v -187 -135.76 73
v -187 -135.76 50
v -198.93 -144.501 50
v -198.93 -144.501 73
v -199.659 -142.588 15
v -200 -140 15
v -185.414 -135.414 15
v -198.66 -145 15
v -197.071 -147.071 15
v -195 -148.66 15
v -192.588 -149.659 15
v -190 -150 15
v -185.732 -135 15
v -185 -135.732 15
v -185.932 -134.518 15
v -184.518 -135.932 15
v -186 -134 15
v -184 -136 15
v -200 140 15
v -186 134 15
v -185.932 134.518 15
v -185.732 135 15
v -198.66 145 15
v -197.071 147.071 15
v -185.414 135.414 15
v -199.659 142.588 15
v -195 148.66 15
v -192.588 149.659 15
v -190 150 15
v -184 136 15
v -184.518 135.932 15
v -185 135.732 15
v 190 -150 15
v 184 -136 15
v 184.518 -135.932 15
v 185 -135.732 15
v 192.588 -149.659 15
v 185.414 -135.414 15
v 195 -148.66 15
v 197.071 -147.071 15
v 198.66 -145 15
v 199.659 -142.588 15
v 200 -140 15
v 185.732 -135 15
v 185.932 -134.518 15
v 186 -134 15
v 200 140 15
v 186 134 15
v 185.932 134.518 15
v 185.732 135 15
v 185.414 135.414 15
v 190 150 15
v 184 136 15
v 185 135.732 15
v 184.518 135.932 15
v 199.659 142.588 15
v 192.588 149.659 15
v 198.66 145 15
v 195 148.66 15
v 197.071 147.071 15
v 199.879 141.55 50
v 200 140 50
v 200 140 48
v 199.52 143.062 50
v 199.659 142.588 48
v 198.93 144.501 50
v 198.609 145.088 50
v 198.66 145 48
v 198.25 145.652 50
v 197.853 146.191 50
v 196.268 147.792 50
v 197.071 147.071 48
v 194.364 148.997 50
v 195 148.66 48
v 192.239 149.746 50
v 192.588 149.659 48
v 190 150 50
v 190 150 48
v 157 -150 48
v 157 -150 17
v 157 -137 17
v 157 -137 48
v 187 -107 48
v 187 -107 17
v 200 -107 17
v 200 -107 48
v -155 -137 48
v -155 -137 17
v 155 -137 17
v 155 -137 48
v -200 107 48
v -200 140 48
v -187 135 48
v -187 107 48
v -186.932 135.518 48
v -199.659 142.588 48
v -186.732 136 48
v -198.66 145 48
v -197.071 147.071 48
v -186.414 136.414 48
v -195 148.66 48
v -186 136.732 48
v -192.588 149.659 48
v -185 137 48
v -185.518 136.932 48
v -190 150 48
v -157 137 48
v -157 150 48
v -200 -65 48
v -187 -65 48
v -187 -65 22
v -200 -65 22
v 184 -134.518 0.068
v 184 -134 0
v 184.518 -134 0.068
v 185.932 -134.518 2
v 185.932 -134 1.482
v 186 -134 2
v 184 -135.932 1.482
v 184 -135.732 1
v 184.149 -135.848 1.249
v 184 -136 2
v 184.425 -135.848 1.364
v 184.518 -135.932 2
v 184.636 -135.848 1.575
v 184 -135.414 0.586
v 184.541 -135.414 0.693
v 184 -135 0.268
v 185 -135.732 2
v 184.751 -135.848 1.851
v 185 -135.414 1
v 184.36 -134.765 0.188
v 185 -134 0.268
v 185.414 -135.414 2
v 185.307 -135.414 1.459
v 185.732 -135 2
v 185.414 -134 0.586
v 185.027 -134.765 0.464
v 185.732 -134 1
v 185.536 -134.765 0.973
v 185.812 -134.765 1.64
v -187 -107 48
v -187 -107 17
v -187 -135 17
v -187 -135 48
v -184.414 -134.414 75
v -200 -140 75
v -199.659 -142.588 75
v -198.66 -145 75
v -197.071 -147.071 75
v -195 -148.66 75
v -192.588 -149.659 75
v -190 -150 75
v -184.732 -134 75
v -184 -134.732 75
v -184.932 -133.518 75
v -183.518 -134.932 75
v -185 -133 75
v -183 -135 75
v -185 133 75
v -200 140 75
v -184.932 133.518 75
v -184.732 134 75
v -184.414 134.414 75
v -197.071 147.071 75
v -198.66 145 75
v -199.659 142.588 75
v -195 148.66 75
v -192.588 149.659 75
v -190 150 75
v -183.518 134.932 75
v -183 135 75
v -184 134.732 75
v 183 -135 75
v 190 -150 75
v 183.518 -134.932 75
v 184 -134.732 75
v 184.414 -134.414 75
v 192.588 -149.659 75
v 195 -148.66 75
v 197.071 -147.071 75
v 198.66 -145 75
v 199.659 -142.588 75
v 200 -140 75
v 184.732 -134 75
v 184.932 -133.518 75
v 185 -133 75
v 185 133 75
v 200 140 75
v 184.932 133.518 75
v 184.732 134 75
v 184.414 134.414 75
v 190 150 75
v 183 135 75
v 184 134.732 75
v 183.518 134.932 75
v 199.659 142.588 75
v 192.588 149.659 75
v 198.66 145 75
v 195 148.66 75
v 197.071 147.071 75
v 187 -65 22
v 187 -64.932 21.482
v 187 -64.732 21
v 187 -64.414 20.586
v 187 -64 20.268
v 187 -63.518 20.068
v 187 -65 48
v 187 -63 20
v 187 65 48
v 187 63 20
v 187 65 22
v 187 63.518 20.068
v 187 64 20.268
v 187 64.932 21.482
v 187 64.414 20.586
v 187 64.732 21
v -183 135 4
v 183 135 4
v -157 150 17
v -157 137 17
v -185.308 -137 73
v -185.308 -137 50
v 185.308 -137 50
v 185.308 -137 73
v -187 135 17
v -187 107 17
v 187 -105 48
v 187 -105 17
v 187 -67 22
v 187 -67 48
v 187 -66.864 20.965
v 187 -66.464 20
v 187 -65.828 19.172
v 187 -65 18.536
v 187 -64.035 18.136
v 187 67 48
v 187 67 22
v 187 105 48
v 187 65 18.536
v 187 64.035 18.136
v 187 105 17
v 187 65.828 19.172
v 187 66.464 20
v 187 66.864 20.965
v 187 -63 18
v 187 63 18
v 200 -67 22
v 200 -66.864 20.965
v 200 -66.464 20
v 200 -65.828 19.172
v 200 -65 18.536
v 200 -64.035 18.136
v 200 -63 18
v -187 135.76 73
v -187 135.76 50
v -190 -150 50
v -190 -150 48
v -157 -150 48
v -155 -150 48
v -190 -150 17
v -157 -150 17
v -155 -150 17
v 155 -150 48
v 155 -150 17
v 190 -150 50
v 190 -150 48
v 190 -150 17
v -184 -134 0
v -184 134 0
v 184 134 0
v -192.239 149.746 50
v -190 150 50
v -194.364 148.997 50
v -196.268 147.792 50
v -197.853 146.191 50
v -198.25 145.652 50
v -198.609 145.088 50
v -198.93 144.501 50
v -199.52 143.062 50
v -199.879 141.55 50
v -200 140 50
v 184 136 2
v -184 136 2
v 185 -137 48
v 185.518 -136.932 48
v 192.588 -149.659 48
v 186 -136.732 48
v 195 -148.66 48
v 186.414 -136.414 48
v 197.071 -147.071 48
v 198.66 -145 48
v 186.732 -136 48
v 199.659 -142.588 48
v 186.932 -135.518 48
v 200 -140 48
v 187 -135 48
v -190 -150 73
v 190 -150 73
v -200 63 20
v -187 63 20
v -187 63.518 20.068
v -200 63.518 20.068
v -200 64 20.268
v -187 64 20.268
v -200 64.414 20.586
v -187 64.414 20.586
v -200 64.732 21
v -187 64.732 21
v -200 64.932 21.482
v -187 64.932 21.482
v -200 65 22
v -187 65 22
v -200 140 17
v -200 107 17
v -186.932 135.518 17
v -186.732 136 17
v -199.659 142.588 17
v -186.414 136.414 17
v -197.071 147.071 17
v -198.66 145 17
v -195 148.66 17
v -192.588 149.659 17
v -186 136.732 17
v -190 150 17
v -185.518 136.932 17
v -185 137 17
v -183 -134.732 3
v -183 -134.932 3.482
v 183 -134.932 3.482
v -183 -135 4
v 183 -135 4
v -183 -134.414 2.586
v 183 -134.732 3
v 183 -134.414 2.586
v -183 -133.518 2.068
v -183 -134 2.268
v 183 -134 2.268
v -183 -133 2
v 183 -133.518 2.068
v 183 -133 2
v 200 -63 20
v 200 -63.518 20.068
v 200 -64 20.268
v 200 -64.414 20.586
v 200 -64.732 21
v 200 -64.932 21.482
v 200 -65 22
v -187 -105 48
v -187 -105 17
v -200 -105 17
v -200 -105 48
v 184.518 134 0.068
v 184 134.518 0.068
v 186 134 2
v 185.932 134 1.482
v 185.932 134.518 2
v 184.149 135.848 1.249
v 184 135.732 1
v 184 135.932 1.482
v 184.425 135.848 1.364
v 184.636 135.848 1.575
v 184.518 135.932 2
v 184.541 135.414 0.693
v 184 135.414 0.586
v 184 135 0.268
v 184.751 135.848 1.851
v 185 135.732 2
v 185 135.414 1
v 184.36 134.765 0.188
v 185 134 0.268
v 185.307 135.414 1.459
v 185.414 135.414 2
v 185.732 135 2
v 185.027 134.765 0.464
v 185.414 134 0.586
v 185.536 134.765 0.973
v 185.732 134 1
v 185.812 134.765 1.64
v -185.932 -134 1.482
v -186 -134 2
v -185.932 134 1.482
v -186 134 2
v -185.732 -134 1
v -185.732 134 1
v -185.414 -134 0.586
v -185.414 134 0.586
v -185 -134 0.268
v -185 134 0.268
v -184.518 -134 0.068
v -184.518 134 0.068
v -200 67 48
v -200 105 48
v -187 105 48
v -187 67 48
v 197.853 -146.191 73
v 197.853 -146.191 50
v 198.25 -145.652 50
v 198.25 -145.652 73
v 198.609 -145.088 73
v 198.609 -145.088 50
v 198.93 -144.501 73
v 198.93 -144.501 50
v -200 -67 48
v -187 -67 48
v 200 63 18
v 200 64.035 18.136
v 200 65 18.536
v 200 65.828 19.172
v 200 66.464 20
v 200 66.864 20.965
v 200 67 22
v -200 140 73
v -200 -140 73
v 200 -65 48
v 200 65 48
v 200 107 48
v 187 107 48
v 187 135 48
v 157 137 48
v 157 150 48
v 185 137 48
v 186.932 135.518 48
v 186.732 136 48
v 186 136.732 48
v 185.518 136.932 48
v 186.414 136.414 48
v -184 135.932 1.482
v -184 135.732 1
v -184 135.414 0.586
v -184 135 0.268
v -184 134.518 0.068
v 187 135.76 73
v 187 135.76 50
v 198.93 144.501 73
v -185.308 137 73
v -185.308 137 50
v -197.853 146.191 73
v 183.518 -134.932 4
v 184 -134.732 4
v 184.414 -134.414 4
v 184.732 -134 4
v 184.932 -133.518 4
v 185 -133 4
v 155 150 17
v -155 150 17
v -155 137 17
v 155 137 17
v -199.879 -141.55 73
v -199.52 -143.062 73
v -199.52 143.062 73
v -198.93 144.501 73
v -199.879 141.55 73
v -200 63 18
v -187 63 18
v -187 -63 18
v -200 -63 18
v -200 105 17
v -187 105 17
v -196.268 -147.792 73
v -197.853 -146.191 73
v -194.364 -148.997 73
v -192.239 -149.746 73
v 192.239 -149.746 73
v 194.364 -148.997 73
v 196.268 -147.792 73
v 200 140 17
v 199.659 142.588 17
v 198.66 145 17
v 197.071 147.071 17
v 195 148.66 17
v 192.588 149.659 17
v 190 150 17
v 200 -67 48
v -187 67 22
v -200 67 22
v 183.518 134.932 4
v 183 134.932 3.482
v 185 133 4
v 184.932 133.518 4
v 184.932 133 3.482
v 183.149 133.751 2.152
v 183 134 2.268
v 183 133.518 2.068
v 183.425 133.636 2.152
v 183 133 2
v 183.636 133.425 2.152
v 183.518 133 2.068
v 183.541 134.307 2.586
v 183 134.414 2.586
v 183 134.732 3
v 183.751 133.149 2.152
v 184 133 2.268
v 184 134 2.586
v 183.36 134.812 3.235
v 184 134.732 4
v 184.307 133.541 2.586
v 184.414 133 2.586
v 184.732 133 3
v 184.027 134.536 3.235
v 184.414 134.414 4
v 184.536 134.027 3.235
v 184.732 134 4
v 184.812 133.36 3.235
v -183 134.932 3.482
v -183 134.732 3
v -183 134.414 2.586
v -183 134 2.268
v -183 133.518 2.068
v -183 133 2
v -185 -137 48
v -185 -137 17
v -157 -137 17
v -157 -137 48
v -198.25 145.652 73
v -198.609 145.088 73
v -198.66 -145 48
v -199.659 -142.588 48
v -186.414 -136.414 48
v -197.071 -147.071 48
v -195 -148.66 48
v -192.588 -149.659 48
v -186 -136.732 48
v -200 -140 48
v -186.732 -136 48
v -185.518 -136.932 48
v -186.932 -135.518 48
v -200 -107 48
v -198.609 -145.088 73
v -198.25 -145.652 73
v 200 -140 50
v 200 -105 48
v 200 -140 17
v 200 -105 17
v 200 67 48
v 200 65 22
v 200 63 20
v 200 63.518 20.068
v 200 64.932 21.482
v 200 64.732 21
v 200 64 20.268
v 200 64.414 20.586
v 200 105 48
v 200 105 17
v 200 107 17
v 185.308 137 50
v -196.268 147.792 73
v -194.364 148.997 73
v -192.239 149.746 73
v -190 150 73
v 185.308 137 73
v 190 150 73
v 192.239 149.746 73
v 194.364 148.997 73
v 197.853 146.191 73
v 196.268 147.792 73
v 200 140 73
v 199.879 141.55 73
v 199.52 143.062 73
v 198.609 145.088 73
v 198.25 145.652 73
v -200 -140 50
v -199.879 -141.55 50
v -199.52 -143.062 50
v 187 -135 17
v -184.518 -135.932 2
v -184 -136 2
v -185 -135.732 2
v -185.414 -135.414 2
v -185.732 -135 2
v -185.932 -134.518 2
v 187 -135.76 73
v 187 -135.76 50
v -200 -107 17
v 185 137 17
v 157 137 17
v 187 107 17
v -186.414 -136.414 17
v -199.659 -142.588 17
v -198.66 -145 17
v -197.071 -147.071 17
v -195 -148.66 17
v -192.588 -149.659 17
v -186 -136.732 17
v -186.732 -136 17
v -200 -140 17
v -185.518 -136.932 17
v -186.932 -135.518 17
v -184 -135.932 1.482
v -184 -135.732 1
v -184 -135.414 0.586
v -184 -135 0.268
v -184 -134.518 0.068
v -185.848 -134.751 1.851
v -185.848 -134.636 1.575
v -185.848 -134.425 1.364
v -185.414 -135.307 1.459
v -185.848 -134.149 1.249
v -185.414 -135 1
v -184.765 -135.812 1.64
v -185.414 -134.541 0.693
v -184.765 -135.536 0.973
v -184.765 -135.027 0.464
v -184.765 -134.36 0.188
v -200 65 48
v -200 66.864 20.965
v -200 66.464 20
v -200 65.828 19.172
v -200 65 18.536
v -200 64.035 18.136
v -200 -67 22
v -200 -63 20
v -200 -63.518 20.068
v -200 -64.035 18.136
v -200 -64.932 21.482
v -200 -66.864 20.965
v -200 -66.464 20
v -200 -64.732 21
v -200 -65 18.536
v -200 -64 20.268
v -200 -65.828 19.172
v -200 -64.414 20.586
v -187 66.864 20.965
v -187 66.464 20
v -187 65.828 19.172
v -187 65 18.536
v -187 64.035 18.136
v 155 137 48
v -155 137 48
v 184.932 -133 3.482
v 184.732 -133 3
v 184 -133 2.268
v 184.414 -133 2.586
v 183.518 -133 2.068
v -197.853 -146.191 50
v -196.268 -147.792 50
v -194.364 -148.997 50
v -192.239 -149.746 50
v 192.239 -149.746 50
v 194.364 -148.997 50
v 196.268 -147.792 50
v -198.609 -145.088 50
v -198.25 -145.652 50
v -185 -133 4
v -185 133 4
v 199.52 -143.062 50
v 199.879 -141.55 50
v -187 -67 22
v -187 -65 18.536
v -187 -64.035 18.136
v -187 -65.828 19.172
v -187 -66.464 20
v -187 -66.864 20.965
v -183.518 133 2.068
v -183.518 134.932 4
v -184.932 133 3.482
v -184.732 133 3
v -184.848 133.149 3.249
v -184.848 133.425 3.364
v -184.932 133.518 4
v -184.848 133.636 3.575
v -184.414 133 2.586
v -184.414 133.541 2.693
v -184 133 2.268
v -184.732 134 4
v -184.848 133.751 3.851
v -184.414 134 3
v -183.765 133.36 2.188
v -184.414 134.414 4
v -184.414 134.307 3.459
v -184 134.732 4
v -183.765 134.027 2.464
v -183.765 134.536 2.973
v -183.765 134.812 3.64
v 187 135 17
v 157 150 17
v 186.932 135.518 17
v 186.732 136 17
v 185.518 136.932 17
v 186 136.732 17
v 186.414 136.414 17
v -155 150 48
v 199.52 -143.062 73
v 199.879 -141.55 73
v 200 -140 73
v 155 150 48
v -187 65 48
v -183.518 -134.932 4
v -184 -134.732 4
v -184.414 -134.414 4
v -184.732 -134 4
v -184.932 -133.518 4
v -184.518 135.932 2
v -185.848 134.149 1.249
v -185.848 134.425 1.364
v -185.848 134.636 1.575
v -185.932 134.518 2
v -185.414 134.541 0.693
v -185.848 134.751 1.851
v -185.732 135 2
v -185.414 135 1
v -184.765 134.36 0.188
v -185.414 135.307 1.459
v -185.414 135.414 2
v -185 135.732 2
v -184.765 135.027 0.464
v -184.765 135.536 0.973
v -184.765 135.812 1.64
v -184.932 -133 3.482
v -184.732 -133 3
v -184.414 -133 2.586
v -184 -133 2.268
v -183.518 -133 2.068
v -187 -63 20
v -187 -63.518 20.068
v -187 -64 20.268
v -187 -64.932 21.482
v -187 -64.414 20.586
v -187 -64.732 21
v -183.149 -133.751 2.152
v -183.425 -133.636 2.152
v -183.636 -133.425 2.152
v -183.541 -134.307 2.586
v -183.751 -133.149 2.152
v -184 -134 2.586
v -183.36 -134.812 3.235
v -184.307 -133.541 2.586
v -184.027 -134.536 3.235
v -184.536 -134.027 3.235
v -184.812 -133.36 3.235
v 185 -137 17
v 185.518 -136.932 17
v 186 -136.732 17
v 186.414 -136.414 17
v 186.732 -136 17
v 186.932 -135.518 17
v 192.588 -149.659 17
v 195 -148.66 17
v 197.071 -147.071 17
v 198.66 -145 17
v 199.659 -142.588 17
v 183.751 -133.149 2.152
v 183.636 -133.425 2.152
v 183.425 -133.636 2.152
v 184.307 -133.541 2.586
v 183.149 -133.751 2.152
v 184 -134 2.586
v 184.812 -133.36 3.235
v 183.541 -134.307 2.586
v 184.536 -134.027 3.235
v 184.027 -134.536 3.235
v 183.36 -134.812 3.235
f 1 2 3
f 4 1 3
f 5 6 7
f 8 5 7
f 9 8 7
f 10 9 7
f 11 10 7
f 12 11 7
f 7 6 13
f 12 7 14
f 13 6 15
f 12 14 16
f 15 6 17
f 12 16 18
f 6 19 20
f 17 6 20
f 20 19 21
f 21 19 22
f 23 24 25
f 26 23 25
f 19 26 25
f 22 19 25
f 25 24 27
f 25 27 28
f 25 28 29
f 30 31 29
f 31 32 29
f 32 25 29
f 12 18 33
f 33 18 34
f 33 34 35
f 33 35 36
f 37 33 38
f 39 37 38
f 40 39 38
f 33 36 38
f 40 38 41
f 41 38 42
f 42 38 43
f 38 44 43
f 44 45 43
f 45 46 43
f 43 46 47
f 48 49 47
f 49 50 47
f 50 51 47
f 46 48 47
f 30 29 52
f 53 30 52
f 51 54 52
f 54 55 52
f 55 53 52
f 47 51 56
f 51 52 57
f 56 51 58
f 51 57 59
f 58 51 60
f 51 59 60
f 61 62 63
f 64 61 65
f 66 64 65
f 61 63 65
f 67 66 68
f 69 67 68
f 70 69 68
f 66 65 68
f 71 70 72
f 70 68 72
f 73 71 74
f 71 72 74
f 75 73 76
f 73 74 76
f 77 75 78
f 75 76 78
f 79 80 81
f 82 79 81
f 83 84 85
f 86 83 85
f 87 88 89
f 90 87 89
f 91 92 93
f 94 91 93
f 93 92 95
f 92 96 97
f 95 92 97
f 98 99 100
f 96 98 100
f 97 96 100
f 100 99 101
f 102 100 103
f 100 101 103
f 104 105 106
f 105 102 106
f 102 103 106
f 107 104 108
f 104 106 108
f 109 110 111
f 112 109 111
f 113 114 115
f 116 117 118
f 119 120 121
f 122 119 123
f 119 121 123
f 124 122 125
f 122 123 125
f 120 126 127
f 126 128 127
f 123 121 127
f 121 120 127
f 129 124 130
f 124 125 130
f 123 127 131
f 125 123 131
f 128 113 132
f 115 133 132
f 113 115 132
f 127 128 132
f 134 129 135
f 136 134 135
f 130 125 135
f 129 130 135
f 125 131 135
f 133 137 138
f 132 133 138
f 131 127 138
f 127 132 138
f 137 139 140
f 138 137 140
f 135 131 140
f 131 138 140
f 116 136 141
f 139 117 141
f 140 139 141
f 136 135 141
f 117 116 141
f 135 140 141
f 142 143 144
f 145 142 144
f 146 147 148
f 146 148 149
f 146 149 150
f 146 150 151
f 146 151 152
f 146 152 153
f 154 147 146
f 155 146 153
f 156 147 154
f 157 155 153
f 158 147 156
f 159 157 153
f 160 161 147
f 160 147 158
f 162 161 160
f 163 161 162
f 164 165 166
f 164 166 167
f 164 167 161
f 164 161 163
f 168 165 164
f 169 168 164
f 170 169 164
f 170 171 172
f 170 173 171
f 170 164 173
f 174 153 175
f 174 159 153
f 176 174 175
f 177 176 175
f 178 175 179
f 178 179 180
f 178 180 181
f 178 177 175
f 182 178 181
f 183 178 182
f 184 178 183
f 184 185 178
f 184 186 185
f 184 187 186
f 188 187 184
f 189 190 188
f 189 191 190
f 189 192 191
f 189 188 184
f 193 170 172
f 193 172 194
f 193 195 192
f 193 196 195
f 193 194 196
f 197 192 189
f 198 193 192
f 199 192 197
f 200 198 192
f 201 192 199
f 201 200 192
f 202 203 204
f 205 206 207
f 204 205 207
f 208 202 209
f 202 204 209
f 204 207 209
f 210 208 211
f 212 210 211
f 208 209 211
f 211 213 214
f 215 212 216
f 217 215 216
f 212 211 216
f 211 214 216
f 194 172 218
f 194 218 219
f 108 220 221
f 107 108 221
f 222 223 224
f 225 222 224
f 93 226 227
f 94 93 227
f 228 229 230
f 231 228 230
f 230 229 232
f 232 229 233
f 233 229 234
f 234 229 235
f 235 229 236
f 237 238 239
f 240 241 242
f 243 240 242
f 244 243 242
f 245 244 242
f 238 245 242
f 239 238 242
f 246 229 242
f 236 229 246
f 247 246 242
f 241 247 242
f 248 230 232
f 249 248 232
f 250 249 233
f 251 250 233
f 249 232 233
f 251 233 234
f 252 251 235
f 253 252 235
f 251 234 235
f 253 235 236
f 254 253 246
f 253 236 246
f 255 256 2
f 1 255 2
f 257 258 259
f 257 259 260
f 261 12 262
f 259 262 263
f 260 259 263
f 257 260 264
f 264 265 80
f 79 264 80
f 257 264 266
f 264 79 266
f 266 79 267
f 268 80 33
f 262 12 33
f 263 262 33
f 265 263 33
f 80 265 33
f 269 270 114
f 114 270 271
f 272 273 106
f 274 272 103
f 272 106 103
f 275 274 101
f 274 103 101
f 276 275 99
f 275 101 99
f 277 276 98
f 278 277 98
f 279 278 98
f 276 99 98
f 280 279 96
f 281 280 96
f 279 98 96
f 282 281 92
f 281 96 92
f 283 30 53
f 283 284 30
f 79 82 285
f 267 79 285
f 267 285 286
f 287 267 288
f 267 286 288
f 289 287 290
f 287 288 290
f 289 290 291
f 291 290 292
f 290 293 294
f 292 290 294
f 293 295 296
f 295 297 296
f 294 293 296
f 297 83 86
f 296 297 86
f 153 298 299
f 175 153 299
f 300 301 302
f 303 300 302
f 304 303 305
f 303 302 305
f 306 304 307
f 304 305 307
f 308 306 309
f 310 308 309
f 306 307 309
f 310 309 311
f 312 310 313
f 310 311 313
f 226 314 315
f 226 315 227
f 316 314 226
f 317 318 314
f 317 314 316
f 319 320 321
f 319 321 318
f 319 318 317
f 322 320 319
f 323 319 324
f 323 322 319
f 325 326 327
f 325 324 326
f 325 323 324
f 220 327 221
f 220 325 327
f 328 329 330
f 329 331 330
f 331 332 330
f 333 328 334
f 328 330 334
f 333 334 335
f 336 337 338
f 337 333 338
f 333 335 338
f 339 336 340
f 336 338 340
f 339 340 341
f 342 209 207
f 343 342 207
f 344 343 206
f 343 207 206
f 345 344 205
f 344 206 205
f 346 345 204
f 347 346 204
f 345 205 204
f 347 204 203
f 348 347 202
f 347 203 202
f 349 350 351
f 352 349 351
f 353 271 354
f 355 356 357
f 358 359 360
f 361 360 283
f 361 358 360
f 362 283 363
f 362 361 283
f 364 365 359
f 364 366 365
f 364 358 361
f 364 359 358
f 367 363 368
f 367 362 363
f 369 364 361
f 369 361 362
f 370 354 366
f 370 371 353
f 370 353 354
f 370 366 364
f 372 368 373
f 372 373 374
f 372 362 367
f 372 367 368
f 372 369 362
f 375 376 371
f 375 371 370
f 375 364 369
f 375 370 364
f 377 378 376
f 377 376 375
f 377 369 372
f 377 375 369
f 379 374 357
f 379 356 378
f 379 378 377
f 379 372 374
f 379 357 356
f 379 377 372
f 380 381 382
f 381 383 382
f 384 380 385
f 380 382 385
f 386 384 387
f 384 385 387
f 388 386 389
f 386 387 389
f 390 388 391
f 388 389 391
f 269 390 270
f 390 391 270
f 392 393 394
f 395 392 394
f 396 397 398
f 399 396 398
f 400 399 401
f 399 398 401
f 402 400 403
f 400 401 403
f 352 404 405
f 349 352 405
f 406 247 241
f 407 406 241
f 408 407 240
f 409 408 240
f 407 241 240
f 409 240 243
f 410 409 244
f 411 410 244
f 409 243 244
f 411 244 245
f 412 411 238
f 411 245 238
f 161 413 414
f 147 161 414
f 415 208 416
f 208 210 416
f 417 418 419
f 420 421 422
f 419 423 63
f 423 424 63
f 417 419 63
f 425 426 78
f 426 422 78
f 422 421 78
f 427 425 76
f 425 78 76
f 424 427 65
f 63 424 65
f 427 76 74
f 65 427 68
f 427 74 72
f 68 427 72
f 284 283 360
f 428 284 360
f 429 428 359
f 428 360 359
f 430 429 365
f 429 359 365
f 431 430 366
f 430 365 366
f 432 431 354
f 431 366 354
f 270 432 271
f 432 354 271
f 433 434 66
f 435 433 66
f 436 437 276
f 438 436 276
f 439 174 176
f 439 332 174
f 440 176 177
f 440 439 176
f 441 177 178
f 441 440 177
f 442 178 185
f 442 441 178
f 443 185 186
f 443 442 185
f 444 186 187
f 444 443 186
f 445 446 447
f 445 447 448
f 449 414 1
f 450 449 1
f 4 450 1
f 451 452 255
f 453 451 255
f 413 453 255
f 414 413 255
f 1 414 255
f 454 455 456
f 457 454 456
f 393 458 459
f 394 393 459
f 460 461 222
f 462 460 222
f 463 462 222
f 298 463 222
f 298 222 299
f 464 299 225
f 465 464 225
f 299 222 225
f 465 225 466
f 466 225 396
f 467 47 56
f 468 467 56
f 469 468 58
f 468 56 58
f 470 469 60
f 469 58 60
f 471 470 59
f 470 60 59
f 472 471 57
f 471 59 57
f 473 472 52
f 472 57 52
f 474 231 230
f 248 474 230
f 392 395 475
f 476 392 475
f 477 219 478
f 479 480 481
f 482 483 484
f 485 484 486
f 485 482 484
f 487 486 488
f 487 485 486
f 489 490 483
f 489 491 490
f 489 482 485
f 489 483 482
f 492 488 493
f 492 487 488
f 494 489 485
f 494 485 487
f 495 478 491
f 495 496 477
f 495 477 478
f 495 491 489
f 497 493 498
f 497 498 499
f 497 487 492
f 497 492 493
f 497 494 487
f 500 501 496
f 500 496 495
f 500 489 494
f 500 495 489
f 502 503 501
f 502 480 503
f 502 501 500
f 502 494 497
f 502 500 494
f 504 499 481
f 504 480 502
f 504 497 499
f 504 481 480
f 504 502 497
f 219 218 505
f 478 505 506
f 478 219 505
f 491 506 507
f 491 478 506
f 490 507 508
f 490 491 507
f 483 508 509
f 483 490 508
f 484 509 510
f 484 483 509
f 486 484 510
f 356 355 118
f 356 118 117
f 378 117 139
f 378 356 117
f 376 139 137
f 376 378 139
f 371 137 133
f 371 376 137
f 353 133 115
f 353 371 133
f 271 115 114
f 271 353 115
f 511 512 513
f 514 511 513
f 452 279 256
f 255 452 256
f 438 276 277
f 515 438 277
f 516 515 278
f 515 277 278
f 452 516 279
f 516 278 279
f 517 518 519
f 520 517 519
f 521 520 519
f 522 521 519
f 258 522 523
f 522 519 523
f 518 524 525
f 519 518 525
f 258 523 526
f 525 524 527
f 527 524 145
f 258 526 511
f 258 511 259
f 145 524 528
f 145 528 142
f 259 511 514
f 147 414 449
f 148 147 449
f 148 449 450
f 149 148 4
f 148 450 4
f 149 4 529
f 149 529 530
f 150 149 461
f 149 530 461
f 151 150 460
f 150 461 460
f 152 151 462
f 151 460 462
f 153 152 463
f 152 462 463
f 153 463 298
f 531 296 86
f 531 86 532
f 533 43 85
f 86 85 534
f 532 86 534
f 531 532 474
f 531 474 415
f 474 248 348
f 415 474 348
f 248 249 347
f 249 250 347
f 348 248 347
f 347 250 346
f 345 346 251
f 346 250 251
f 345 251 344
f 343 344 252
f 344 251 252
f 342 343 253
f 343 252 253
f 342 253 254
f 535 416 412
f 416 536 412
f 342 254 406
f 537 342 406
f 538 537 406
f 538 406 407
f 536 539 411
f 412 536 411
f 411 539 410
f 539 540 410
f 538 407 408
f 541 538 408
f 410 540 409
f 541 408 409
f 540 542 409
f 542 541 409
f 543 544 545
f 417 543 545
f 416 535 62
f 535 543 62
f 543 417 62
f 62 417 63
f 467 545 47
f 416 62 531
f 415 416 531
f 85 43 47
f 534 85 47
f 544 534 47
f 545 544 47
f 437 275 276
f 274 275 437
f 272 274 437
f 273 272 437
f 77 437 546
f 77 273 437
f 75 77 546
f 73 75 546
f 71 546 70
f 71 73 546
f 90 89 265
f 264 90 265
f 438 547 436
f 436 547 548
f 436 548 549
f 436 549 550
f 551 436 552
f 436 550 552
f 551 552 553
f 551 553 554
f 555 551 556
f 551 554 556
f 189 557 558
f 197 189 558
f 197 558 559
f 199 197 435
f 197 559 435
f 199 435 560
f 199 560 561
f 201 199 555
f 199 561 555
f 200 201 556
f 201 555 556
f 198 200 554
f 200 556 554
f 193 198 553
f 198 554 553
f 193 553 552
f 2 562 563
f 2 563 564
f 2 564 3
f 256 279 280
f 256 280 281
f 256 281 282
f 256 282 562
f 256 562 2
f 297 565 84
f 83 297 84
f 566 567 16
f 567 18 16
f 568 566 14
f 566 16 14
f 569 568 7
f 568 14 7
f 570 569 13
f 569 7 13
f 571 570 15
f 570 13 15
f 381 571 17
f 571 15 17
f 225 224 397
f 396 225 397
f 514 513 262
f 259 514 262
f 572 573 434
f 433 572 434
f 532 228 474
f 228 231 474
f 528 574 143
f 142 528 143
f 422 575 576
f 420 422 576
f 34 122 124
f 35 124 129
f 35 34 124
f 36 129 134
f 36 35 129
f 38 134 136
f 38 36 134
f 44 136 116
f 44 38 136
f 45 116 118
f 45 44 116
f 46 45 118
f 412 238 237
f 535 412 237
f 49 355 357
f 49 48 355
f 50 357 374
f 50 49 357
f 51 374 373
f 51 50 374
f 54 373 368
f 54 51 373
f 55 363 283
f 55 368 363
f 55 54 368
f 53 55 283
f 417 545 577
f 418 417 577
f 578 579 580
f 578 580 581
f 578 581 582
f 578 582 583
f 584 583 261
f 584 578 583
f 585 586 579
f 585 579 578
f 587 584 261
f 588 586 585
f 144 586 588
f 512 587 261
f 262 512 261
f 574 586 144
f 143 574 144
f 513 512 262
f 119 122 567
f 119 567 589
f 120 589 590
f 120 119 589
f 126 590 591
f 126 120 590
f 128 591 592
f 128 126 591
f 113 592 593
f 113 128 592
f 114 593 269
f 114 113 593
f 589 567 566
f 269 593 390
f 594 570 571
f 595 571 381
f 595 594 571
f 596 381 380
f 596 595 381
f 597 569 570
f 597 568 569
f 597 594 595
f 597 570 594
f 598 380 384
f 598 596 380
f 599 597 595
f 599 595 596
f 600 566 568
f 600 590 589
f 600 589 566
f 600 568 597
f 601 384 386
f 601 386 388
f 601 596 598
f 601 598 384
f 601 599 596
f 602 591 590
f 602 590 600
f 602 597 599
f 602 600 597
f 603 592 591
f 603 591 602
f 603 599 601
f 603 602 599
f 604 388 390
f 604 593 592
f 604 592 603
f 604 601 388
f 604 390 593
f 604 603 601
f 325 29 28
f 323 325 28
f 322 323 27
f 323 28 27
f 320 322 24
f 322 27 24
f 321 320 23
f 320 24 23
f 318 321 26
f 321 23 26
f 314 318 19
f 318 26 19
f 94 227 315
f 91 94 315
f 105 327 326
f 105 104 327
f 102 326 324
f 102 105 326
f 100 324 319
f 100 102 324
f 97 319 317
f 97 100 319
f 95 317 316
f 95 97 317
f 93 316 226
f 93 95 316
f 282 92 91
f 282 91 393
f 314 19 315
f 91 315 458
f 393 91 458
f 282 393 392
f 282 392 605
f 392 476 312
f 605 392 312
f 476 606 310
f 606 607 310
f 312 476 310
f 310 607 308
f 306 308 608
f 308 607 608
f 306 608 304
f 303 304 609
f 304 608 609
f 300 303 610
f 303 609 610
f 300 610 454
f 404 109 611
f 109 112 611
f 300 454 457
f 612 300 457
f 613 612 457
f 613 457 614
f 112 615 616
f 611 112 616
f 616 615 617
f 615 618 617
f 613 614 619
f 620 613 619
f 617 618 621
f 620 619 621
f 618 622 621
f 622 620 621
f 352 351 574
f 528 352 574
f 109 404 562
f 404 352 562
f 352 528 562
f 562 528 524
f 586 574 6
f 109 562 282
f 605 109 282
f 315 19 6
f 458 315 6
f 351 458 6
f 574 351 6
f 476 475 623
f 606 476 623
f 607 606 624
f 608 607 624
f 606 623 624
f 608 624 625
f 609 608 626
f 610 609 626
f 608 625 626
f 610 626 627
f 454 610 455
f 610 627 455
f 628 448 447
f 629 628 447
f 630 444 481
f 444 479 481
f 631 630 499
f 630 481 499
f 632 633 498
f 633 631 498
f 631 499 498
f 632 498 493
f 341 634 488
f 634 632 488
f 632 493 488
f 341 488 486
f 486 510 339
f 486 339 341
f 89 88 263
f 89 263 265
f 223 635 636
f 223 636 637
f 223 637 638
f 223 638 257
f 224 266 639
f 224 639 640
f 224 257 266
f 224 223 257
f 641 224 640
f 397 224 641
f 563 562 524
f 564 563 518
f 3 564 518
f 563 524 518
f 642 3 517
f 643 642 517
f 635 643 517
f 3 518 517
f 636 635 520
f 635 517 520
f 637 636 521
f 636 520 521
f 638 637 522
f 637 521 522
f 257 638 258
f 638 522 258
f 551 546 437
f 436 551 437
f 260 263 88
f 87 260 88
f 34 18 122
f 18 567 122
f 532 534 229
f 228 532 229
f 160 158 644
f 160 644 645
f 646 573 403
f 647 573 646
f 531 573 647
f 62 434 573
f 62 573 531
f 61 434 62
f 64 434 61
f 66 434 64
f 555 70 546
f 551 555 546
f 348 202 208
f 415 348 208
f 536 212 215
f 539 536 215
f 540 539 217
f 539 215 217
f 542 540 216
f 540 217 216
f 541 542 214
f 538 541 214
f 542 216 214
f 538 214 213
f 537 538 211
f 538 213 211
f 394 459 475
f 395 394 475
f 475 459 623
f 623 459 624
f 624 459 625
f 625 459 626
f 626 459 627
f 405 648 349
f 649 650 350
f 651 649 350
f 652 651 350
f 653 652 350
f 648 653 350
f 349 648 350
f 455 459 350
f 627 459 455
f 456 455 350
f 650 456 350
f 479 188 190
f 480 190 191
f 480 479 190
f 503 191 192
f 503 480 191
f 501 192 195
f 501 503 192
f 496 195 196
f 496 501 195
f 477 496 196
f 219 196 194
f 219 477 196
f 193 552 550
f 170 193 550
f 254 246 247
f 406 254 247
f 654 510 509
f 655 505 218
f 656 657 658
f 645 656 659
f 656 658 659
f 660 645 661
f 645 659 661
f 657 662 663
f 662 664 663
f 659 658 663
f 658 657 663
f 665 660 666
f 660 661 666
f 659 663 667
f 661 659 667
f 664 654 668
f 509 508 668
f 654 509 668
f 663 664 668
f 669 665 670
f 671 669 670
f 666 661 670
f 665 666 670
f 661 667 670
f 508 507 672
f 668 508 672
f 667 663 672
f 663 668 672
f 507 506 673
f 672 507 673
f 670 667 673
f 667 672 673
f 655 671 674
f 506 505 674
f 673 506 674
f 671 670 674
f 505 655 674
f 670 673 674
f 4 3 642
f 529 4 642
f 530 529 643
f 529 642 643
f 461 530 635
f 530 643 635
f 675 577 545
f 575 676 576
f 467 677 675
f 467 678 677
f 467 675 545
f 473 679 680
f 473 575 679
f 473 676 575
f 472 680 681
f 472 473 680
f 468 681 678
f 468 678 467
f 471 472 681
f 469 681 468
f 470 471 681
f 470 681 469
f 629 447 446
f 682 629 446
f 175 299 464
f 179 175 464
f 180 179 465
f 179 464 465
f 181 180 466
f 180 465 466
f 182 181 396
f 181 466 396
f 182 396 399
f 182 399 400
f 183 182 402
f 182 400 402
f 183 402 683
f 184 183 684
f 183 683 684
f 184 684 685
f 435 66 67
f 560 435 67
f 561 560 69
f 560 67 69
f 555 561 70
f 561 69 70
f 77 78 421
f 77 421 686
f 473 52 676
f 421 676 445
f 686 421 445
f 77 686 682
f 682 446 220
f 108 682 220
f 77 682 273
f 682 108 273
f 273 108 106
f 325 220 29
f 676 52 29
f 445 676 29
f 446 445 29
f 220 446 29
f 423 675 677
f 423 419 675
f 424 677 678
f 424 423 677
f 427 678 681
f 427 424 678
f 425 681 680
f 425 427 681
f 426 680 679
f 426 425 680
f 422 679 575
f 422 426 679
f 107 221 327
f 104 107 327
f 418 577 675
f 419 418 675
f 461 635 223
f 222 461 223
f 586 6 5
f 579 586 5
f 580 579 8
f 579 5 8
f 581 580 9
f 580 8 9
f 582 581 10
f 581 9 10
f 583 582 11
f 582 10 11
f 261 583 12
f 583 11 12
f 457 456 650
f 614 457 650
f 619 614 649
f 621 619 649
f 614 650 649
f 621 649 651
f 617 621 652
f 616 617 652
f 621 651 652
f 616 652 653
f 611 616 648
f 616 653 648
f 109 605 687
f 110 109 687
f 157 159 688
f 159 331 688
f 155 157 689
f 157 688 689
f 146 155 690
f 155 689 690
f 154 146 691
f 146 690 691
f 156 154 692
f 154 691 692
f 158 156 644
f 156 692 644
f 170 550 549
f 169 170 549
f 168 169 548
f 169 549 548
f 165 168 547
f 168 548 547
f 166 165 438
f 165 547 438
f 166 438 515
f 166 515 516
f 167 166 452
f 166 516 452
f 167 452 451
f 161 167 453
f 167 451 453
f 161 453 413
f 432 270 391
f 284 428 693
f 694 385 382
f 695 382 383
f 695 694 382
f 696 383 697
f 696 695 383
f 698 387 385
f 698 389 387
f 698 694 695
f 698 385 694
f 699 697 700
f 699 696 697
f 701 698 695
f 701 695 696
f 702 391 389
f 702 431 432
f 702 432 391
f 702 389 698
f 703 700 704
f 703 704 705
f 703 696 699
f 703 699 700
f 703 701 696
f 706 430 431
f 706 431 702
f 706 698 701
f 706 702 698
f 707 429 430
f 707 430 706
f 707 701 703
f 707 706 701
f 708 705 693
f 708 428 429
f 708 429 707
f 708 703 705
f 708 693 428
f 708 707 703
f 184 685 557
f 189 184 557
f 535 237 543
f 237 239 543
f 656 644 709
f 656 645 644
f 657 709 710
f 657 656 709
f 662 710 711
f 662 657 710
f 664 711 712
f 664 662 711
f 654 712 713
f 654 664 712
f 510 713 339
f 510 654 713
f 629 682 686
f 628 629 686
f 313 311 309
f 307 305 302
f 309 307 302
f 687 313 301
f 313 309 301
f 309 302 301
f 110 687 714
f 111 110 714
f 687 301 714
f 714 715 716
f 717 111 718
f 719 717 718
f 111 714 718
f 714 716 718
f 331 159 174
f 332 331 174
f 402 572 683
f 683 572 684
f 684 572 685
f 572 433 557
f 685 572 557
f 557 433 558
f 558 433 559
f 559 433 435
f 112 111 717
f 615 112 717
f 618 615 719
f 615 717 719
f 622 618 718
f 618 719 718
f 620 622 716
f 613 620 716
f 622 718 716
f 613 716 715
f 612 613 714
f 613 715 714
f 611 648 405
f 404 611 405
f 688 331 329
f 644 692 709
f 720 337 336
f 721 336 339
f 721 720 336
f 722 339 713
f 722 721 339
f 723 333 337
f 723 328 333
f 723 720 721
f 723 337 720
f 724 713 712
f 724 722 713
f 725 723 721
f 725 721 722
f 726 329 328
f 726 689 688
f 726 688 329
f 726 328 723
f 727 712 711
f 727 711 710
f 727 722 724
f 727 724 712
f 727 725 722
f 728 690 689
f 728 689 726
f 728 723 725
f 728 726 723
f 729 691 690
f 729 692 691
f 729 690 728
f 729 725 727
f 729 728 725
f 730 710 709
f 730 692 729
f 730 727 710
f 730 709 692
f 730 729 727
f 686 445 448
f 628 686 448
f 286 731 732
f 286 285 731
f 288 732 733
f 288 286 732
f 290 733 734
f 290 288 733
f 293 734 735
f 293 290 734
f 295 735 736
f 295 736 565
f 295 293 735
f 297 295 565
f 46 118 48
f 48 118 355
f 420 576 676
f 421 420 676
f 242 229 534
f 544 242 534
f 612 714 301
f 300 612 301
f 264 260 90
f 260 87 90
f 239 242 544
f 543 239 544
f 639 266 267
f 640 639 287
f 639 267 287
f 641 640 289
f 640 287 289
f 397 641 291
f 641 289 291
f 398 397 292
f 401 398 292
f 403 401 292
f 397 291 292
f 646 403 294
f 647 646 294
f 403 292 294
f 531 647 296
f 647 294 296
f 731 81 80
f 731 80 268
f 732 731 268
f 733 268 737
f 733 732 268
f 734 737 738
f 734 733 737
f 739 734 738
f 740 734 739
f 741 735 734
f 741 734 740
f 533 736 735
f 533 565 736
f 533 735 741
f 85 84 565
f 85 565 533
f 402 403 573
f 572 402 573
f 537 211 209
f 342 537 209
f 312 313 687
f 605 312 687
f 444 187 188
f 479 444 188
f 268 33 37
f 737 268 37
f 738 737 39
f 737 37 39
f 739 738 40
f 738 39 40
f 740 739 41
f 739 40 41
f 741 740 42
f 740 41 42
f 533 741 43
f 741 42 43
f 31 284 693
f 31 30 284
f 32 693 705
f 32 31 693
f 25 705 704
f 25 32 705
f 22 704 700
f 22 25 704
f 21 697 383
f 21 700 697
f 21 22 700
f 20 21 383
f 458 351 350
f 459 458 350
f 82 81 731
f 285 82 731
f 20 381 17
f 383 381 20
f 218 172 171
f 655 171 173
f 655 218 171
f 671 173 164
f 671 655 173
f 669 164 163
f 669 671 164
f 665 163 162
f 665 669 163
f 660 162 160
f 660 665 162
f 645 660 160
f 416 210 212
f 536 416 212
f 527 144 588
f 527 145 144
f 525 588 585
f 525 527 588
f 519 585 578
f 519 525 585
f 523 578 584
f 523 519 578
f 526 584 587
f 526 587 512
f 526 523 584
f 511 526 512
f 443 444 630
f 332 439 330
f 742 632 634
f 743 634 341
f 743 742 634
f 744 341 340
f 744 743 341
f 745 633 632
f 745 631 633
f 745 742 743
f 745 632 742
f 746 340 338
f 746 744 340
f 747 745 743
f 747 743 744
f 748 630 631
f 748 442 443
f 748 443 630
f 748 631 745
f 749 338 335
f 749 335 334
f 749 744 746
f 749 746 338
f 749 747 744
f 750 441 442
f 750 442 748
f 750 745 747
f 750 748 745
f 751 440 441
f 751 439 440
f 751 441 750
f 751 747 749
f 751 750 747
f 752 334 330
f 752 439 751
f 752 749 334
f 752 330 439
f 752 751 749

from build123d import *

# Parameters (mm, degrees)
F0_W      = 372
F0_H      = 272
F1_DEPTH  = 15
F2_W      = 372
F2_H      = 272
F3_DEPTH  = 2
F5_DEPTH  = 31
F7_DEPTH  = 2
F9_DEPTH  = 23
F11_DEPTH = 2
F12_W     = 370
F12_H     = 270
F13_DEPTH = 73
F15_DEPTH = 13
F17_DEPTH = 13
F18_R     = 2


with BuildPart() as f1:
    # F0 (on Top) → F1 (new body)
    with BuildSketch(Plane.XY):
        Rectangle(F0_W, F0_H)
    extrude(amount=F1_DEPTH)

    # F2 (on face) → F3 (join)
    with BuildSketch(Plane.XY.offset(15)):
        with BuildLine():
            Line((-190, -150), (190, -150))
            ThreePointArc((190, -150), (197.0710678119, -147.0710678119), (200, -140))
            Line((200, -140), (200, 140))
            ThreePointArc((200, 140), (197.0710678119, 147.0710678119), (190, 150))
            Line((190, 150), (-190, 150))
            ThreePointArc((-190, 150), (-197.0710678119, 147.0710678119), (-200, 140))
            Line((-200, 140), (-200, -140))
            ThreePointArc((-200, -140), (-197.0710678119, -147.0710678119), (-190, -150))
        make_face()
        Rectangle(F2_W, F2_H, mode=Mode.SUBTRACT)
        Rectangle(F2_W, F2_H)
    extrude(amount=F3_DEPTH)

    # F4 (on face) → F5 (join)
    with BuildSketch(Plane.XY.offset(17)):
        Polygon((157, -137), (187, -137), (187, -107), (200, -107), (200, -105), (187, -105), (187, 105), (200, 105), (200, 107), (187, 107), (187, 137), (157, 137), (157, 150), (155, 150), (155, 137), (-155, 137), (-155, 150), (-157, 150), (-157, 137), (-187, 137), (-187, 107), (-200, 107), (-200, 105), (-187, 105), (-187, -105), (-200, -105), (-200, -107), (-187, -107), (-187, -137), (-157, -137), (-157, -150), (-155, -150), (-155, -137), (155, -137), (155, -150), (157, -150), align=None)
    extrude(amount=F5_DEPTH)

    # F6 (on face) → F7 (join)
    with BuildSketch(Plane.XY.offset(48)):
        with BuildLine():
            Line((190, 150), (-190, 150))
            ThreePointArc((-190, 150), (-197.0710678119, 147.0710678119), (-200, 140))
            Line((-200, 140), (-200, -140))
            ThreePointArc((-200, -140), (-197.0710678119, -147.0710678119), (-190, -150))
            Line((-190, -150), (190, -150))
            ThreePointArc((190, -150), (197.0710678119, -147.0710678119), (200, -140))
            Line((200, -140), (200, 140))
            ThreePointArc((200, 140), (197.0710678119, 147.0710678119), (190, 150))
        make_face()
    extrude(amount=F7_DEPTH)

    # F8 (on face) → F9 (join)
    with BuildSketch(Plane.XY.offset(50)):
        with BuildLine():
            Line((-185.3079227659, -137), (185.3079227659, -137))
            Line((185.3079227659, -137), (197.8531877713, -146.1909160735))
            ThreePointArc((197.8531877713, -146.1909160735), (198.4340605379, -145.3727667773), (198.9300207482, -144.5005254622))
            Line((198.9300207482, -144.5005254622), (187, -135.7603498338))
            Line((187, -135.7603498338), (187, 135.7603498338))
            Line((187, 135.7603498338), (198.9300207482, 144.5005254622))
            ThreePointArc((198.9300207482, 144.5005254622), (198.4340605379, 145.3727667773), (197.8531877713, 146.1909160735))
            Line((197.8531877713, 146.1909160735), (185.3079227659, 137))
            Line((185.3079227659, 137), (-185.3079227659, 137))
            Line((-185.3079227659, 137), (-197.8531877713, 146.1909160735))
            ThreePointArc((-197.8531877713, 146.1909160735), (-198.4340605379, 145.3727667773), (-198.9300207482, 144.5005254622))
            Line((-198.9300207482, 144.5005254622), (-187, 135.7603498338))
            Line((-187, 135.7603498338), (-187, -135.7603498338))
            Line((-187, -135.7603498338), (-198.9300207482, -144.5005254622))
            ThreePointArc((-198.9300207482, -144.5005254622), (-198.4340605379, -145.3727667773), (-197.8531877713, -146.1909160735))
            Line((-197.8531877713, -146.1909160735), (-185.3079227659, -137))
        make_face()
    extrude(amount=F9_DEPTH)

    # F10 (on face) → F11 (join)
    with BuildSketch(Plane.XY.offset(73)):
        with BuildLine():
            Line((-190, -150), (190, -150))
            ThreePointArc((190, -150), (197.0710678119, -147.0710678119), (200, -140))
            Line((200, -140), (200, 140))
            ThreePointArc((200, 140), (197.0710678119, 147.0710678119), (190, 150))
            Line((190, 150), (-190, 150))
            ThreePointArc((-190, 150), (-197.0710678119, 147.0710678119), (-200, 140))
            Line((-200, 140), (-200, -140))
            ThreePointArc((-200, -140), (-197.0710678119, -147.0710678119), (-190, -150))
        make_face()
    extrude(amount=F11_DEPTH)

    # F12 (on face) → F13 (cut)
    with BuildSketch(Plane.XY.offset(75)):
        Rectangle(F12_W, F12_H)
    extrude(amount=-F13_DEPTH, mode=Mode.SUBTRACT)

    # F14 (on face) → F15 (join, through all)
    with BuildSketch(Plane(origin=(-187, 0, 0), x_dir=(0, -1, 0), z_dir=(-1, 0, 0))):
        with BuildLine():
            Line((-63, 18), (63, 18))
            ThreePointArc((63, 18), (65.8284271247, 19.1715728753), (67, 22))
            Line((67, 22), (67, 48))
            Line((67, 48), (65, 48))
            Line((65, 48), (65, 22))
            ThreePointArc((65, 22), (64.4142135624, 20.5857864376), (63, 20))
            Line((63, 20), (-63, 20))
            ThreePointArc((-63, 20), (-64.4142135624, 20.5857864376), (-65, 22))
            Line((-65, 22), (-65, 48))
            Line((-65, 48), (-67, 48))
            Line((-67, 48), (-67, 22))
            ThreePointArc((-67, 22), (-65.8284271247, 19.1715728753), (-63, 18))
        make_face()
    extrude(amount=F15_DEPTH)

    # F16 (on face) → F17 (join, through all)
    with BuildSketch(Plane.YZ.offset(187)):
        with BuildLine():
            ThreePointArc((63, 18), (65.8284271247, 19.1715728753), (67, 22))
            Line((67, 22), (67, 48))
            Line((67, 48), (65, 48))
            Line((65, 48), (65, 22))
            ThreePointArc((65, 22), (64.4142135624, 20.5857864376), (63, 20))
            Line((63, 20), (-63, 20))
            ThreePointArc((-63, 20), (-64.4142135624, 20.5857864376), (-65, 22))
            Line((-65, 22), (-65, 48))
            Line((-65, 48), (-67, 48))
            Line((-67, 48), (-67, 22))
            ThreePointArc((-67, 22), (-65.8284271247, 19.1715728753), (-63, 18))
            Line((-63, 18), (63, 18))
        make_face()
    extrude(amount=F17_DEPTH)

    # F18
    f18_edges = [f1.edges().sort_by_distance(p)[0] for p in [
        (-185, -135, 38.5),
        (185, -135, 38.5),
        (185, 135, 38.5),
        (0, 135, 2),
        (185, 0, 2),
        (0, -135, 2),
        (-185, 0, 2),
        (-185, 135, 38.5),
        (187, -137, 32.5),
        (187, 137, 32.5),
        (-187, 137, 32.5),
        (-187, -137, 32.5),
        (186, 0, 0),
        (0, 136, 0),
        (186, 136, 7.5),
        (0, -136, 0),
        (186, -136, 7.5),
        (-186, -136, 7.5),
        (-186, 0, 0),
        (-186, 136, 7.5),
    ]]
    fillet(f18_edges, radius=F18_R)


solid = f1.part
